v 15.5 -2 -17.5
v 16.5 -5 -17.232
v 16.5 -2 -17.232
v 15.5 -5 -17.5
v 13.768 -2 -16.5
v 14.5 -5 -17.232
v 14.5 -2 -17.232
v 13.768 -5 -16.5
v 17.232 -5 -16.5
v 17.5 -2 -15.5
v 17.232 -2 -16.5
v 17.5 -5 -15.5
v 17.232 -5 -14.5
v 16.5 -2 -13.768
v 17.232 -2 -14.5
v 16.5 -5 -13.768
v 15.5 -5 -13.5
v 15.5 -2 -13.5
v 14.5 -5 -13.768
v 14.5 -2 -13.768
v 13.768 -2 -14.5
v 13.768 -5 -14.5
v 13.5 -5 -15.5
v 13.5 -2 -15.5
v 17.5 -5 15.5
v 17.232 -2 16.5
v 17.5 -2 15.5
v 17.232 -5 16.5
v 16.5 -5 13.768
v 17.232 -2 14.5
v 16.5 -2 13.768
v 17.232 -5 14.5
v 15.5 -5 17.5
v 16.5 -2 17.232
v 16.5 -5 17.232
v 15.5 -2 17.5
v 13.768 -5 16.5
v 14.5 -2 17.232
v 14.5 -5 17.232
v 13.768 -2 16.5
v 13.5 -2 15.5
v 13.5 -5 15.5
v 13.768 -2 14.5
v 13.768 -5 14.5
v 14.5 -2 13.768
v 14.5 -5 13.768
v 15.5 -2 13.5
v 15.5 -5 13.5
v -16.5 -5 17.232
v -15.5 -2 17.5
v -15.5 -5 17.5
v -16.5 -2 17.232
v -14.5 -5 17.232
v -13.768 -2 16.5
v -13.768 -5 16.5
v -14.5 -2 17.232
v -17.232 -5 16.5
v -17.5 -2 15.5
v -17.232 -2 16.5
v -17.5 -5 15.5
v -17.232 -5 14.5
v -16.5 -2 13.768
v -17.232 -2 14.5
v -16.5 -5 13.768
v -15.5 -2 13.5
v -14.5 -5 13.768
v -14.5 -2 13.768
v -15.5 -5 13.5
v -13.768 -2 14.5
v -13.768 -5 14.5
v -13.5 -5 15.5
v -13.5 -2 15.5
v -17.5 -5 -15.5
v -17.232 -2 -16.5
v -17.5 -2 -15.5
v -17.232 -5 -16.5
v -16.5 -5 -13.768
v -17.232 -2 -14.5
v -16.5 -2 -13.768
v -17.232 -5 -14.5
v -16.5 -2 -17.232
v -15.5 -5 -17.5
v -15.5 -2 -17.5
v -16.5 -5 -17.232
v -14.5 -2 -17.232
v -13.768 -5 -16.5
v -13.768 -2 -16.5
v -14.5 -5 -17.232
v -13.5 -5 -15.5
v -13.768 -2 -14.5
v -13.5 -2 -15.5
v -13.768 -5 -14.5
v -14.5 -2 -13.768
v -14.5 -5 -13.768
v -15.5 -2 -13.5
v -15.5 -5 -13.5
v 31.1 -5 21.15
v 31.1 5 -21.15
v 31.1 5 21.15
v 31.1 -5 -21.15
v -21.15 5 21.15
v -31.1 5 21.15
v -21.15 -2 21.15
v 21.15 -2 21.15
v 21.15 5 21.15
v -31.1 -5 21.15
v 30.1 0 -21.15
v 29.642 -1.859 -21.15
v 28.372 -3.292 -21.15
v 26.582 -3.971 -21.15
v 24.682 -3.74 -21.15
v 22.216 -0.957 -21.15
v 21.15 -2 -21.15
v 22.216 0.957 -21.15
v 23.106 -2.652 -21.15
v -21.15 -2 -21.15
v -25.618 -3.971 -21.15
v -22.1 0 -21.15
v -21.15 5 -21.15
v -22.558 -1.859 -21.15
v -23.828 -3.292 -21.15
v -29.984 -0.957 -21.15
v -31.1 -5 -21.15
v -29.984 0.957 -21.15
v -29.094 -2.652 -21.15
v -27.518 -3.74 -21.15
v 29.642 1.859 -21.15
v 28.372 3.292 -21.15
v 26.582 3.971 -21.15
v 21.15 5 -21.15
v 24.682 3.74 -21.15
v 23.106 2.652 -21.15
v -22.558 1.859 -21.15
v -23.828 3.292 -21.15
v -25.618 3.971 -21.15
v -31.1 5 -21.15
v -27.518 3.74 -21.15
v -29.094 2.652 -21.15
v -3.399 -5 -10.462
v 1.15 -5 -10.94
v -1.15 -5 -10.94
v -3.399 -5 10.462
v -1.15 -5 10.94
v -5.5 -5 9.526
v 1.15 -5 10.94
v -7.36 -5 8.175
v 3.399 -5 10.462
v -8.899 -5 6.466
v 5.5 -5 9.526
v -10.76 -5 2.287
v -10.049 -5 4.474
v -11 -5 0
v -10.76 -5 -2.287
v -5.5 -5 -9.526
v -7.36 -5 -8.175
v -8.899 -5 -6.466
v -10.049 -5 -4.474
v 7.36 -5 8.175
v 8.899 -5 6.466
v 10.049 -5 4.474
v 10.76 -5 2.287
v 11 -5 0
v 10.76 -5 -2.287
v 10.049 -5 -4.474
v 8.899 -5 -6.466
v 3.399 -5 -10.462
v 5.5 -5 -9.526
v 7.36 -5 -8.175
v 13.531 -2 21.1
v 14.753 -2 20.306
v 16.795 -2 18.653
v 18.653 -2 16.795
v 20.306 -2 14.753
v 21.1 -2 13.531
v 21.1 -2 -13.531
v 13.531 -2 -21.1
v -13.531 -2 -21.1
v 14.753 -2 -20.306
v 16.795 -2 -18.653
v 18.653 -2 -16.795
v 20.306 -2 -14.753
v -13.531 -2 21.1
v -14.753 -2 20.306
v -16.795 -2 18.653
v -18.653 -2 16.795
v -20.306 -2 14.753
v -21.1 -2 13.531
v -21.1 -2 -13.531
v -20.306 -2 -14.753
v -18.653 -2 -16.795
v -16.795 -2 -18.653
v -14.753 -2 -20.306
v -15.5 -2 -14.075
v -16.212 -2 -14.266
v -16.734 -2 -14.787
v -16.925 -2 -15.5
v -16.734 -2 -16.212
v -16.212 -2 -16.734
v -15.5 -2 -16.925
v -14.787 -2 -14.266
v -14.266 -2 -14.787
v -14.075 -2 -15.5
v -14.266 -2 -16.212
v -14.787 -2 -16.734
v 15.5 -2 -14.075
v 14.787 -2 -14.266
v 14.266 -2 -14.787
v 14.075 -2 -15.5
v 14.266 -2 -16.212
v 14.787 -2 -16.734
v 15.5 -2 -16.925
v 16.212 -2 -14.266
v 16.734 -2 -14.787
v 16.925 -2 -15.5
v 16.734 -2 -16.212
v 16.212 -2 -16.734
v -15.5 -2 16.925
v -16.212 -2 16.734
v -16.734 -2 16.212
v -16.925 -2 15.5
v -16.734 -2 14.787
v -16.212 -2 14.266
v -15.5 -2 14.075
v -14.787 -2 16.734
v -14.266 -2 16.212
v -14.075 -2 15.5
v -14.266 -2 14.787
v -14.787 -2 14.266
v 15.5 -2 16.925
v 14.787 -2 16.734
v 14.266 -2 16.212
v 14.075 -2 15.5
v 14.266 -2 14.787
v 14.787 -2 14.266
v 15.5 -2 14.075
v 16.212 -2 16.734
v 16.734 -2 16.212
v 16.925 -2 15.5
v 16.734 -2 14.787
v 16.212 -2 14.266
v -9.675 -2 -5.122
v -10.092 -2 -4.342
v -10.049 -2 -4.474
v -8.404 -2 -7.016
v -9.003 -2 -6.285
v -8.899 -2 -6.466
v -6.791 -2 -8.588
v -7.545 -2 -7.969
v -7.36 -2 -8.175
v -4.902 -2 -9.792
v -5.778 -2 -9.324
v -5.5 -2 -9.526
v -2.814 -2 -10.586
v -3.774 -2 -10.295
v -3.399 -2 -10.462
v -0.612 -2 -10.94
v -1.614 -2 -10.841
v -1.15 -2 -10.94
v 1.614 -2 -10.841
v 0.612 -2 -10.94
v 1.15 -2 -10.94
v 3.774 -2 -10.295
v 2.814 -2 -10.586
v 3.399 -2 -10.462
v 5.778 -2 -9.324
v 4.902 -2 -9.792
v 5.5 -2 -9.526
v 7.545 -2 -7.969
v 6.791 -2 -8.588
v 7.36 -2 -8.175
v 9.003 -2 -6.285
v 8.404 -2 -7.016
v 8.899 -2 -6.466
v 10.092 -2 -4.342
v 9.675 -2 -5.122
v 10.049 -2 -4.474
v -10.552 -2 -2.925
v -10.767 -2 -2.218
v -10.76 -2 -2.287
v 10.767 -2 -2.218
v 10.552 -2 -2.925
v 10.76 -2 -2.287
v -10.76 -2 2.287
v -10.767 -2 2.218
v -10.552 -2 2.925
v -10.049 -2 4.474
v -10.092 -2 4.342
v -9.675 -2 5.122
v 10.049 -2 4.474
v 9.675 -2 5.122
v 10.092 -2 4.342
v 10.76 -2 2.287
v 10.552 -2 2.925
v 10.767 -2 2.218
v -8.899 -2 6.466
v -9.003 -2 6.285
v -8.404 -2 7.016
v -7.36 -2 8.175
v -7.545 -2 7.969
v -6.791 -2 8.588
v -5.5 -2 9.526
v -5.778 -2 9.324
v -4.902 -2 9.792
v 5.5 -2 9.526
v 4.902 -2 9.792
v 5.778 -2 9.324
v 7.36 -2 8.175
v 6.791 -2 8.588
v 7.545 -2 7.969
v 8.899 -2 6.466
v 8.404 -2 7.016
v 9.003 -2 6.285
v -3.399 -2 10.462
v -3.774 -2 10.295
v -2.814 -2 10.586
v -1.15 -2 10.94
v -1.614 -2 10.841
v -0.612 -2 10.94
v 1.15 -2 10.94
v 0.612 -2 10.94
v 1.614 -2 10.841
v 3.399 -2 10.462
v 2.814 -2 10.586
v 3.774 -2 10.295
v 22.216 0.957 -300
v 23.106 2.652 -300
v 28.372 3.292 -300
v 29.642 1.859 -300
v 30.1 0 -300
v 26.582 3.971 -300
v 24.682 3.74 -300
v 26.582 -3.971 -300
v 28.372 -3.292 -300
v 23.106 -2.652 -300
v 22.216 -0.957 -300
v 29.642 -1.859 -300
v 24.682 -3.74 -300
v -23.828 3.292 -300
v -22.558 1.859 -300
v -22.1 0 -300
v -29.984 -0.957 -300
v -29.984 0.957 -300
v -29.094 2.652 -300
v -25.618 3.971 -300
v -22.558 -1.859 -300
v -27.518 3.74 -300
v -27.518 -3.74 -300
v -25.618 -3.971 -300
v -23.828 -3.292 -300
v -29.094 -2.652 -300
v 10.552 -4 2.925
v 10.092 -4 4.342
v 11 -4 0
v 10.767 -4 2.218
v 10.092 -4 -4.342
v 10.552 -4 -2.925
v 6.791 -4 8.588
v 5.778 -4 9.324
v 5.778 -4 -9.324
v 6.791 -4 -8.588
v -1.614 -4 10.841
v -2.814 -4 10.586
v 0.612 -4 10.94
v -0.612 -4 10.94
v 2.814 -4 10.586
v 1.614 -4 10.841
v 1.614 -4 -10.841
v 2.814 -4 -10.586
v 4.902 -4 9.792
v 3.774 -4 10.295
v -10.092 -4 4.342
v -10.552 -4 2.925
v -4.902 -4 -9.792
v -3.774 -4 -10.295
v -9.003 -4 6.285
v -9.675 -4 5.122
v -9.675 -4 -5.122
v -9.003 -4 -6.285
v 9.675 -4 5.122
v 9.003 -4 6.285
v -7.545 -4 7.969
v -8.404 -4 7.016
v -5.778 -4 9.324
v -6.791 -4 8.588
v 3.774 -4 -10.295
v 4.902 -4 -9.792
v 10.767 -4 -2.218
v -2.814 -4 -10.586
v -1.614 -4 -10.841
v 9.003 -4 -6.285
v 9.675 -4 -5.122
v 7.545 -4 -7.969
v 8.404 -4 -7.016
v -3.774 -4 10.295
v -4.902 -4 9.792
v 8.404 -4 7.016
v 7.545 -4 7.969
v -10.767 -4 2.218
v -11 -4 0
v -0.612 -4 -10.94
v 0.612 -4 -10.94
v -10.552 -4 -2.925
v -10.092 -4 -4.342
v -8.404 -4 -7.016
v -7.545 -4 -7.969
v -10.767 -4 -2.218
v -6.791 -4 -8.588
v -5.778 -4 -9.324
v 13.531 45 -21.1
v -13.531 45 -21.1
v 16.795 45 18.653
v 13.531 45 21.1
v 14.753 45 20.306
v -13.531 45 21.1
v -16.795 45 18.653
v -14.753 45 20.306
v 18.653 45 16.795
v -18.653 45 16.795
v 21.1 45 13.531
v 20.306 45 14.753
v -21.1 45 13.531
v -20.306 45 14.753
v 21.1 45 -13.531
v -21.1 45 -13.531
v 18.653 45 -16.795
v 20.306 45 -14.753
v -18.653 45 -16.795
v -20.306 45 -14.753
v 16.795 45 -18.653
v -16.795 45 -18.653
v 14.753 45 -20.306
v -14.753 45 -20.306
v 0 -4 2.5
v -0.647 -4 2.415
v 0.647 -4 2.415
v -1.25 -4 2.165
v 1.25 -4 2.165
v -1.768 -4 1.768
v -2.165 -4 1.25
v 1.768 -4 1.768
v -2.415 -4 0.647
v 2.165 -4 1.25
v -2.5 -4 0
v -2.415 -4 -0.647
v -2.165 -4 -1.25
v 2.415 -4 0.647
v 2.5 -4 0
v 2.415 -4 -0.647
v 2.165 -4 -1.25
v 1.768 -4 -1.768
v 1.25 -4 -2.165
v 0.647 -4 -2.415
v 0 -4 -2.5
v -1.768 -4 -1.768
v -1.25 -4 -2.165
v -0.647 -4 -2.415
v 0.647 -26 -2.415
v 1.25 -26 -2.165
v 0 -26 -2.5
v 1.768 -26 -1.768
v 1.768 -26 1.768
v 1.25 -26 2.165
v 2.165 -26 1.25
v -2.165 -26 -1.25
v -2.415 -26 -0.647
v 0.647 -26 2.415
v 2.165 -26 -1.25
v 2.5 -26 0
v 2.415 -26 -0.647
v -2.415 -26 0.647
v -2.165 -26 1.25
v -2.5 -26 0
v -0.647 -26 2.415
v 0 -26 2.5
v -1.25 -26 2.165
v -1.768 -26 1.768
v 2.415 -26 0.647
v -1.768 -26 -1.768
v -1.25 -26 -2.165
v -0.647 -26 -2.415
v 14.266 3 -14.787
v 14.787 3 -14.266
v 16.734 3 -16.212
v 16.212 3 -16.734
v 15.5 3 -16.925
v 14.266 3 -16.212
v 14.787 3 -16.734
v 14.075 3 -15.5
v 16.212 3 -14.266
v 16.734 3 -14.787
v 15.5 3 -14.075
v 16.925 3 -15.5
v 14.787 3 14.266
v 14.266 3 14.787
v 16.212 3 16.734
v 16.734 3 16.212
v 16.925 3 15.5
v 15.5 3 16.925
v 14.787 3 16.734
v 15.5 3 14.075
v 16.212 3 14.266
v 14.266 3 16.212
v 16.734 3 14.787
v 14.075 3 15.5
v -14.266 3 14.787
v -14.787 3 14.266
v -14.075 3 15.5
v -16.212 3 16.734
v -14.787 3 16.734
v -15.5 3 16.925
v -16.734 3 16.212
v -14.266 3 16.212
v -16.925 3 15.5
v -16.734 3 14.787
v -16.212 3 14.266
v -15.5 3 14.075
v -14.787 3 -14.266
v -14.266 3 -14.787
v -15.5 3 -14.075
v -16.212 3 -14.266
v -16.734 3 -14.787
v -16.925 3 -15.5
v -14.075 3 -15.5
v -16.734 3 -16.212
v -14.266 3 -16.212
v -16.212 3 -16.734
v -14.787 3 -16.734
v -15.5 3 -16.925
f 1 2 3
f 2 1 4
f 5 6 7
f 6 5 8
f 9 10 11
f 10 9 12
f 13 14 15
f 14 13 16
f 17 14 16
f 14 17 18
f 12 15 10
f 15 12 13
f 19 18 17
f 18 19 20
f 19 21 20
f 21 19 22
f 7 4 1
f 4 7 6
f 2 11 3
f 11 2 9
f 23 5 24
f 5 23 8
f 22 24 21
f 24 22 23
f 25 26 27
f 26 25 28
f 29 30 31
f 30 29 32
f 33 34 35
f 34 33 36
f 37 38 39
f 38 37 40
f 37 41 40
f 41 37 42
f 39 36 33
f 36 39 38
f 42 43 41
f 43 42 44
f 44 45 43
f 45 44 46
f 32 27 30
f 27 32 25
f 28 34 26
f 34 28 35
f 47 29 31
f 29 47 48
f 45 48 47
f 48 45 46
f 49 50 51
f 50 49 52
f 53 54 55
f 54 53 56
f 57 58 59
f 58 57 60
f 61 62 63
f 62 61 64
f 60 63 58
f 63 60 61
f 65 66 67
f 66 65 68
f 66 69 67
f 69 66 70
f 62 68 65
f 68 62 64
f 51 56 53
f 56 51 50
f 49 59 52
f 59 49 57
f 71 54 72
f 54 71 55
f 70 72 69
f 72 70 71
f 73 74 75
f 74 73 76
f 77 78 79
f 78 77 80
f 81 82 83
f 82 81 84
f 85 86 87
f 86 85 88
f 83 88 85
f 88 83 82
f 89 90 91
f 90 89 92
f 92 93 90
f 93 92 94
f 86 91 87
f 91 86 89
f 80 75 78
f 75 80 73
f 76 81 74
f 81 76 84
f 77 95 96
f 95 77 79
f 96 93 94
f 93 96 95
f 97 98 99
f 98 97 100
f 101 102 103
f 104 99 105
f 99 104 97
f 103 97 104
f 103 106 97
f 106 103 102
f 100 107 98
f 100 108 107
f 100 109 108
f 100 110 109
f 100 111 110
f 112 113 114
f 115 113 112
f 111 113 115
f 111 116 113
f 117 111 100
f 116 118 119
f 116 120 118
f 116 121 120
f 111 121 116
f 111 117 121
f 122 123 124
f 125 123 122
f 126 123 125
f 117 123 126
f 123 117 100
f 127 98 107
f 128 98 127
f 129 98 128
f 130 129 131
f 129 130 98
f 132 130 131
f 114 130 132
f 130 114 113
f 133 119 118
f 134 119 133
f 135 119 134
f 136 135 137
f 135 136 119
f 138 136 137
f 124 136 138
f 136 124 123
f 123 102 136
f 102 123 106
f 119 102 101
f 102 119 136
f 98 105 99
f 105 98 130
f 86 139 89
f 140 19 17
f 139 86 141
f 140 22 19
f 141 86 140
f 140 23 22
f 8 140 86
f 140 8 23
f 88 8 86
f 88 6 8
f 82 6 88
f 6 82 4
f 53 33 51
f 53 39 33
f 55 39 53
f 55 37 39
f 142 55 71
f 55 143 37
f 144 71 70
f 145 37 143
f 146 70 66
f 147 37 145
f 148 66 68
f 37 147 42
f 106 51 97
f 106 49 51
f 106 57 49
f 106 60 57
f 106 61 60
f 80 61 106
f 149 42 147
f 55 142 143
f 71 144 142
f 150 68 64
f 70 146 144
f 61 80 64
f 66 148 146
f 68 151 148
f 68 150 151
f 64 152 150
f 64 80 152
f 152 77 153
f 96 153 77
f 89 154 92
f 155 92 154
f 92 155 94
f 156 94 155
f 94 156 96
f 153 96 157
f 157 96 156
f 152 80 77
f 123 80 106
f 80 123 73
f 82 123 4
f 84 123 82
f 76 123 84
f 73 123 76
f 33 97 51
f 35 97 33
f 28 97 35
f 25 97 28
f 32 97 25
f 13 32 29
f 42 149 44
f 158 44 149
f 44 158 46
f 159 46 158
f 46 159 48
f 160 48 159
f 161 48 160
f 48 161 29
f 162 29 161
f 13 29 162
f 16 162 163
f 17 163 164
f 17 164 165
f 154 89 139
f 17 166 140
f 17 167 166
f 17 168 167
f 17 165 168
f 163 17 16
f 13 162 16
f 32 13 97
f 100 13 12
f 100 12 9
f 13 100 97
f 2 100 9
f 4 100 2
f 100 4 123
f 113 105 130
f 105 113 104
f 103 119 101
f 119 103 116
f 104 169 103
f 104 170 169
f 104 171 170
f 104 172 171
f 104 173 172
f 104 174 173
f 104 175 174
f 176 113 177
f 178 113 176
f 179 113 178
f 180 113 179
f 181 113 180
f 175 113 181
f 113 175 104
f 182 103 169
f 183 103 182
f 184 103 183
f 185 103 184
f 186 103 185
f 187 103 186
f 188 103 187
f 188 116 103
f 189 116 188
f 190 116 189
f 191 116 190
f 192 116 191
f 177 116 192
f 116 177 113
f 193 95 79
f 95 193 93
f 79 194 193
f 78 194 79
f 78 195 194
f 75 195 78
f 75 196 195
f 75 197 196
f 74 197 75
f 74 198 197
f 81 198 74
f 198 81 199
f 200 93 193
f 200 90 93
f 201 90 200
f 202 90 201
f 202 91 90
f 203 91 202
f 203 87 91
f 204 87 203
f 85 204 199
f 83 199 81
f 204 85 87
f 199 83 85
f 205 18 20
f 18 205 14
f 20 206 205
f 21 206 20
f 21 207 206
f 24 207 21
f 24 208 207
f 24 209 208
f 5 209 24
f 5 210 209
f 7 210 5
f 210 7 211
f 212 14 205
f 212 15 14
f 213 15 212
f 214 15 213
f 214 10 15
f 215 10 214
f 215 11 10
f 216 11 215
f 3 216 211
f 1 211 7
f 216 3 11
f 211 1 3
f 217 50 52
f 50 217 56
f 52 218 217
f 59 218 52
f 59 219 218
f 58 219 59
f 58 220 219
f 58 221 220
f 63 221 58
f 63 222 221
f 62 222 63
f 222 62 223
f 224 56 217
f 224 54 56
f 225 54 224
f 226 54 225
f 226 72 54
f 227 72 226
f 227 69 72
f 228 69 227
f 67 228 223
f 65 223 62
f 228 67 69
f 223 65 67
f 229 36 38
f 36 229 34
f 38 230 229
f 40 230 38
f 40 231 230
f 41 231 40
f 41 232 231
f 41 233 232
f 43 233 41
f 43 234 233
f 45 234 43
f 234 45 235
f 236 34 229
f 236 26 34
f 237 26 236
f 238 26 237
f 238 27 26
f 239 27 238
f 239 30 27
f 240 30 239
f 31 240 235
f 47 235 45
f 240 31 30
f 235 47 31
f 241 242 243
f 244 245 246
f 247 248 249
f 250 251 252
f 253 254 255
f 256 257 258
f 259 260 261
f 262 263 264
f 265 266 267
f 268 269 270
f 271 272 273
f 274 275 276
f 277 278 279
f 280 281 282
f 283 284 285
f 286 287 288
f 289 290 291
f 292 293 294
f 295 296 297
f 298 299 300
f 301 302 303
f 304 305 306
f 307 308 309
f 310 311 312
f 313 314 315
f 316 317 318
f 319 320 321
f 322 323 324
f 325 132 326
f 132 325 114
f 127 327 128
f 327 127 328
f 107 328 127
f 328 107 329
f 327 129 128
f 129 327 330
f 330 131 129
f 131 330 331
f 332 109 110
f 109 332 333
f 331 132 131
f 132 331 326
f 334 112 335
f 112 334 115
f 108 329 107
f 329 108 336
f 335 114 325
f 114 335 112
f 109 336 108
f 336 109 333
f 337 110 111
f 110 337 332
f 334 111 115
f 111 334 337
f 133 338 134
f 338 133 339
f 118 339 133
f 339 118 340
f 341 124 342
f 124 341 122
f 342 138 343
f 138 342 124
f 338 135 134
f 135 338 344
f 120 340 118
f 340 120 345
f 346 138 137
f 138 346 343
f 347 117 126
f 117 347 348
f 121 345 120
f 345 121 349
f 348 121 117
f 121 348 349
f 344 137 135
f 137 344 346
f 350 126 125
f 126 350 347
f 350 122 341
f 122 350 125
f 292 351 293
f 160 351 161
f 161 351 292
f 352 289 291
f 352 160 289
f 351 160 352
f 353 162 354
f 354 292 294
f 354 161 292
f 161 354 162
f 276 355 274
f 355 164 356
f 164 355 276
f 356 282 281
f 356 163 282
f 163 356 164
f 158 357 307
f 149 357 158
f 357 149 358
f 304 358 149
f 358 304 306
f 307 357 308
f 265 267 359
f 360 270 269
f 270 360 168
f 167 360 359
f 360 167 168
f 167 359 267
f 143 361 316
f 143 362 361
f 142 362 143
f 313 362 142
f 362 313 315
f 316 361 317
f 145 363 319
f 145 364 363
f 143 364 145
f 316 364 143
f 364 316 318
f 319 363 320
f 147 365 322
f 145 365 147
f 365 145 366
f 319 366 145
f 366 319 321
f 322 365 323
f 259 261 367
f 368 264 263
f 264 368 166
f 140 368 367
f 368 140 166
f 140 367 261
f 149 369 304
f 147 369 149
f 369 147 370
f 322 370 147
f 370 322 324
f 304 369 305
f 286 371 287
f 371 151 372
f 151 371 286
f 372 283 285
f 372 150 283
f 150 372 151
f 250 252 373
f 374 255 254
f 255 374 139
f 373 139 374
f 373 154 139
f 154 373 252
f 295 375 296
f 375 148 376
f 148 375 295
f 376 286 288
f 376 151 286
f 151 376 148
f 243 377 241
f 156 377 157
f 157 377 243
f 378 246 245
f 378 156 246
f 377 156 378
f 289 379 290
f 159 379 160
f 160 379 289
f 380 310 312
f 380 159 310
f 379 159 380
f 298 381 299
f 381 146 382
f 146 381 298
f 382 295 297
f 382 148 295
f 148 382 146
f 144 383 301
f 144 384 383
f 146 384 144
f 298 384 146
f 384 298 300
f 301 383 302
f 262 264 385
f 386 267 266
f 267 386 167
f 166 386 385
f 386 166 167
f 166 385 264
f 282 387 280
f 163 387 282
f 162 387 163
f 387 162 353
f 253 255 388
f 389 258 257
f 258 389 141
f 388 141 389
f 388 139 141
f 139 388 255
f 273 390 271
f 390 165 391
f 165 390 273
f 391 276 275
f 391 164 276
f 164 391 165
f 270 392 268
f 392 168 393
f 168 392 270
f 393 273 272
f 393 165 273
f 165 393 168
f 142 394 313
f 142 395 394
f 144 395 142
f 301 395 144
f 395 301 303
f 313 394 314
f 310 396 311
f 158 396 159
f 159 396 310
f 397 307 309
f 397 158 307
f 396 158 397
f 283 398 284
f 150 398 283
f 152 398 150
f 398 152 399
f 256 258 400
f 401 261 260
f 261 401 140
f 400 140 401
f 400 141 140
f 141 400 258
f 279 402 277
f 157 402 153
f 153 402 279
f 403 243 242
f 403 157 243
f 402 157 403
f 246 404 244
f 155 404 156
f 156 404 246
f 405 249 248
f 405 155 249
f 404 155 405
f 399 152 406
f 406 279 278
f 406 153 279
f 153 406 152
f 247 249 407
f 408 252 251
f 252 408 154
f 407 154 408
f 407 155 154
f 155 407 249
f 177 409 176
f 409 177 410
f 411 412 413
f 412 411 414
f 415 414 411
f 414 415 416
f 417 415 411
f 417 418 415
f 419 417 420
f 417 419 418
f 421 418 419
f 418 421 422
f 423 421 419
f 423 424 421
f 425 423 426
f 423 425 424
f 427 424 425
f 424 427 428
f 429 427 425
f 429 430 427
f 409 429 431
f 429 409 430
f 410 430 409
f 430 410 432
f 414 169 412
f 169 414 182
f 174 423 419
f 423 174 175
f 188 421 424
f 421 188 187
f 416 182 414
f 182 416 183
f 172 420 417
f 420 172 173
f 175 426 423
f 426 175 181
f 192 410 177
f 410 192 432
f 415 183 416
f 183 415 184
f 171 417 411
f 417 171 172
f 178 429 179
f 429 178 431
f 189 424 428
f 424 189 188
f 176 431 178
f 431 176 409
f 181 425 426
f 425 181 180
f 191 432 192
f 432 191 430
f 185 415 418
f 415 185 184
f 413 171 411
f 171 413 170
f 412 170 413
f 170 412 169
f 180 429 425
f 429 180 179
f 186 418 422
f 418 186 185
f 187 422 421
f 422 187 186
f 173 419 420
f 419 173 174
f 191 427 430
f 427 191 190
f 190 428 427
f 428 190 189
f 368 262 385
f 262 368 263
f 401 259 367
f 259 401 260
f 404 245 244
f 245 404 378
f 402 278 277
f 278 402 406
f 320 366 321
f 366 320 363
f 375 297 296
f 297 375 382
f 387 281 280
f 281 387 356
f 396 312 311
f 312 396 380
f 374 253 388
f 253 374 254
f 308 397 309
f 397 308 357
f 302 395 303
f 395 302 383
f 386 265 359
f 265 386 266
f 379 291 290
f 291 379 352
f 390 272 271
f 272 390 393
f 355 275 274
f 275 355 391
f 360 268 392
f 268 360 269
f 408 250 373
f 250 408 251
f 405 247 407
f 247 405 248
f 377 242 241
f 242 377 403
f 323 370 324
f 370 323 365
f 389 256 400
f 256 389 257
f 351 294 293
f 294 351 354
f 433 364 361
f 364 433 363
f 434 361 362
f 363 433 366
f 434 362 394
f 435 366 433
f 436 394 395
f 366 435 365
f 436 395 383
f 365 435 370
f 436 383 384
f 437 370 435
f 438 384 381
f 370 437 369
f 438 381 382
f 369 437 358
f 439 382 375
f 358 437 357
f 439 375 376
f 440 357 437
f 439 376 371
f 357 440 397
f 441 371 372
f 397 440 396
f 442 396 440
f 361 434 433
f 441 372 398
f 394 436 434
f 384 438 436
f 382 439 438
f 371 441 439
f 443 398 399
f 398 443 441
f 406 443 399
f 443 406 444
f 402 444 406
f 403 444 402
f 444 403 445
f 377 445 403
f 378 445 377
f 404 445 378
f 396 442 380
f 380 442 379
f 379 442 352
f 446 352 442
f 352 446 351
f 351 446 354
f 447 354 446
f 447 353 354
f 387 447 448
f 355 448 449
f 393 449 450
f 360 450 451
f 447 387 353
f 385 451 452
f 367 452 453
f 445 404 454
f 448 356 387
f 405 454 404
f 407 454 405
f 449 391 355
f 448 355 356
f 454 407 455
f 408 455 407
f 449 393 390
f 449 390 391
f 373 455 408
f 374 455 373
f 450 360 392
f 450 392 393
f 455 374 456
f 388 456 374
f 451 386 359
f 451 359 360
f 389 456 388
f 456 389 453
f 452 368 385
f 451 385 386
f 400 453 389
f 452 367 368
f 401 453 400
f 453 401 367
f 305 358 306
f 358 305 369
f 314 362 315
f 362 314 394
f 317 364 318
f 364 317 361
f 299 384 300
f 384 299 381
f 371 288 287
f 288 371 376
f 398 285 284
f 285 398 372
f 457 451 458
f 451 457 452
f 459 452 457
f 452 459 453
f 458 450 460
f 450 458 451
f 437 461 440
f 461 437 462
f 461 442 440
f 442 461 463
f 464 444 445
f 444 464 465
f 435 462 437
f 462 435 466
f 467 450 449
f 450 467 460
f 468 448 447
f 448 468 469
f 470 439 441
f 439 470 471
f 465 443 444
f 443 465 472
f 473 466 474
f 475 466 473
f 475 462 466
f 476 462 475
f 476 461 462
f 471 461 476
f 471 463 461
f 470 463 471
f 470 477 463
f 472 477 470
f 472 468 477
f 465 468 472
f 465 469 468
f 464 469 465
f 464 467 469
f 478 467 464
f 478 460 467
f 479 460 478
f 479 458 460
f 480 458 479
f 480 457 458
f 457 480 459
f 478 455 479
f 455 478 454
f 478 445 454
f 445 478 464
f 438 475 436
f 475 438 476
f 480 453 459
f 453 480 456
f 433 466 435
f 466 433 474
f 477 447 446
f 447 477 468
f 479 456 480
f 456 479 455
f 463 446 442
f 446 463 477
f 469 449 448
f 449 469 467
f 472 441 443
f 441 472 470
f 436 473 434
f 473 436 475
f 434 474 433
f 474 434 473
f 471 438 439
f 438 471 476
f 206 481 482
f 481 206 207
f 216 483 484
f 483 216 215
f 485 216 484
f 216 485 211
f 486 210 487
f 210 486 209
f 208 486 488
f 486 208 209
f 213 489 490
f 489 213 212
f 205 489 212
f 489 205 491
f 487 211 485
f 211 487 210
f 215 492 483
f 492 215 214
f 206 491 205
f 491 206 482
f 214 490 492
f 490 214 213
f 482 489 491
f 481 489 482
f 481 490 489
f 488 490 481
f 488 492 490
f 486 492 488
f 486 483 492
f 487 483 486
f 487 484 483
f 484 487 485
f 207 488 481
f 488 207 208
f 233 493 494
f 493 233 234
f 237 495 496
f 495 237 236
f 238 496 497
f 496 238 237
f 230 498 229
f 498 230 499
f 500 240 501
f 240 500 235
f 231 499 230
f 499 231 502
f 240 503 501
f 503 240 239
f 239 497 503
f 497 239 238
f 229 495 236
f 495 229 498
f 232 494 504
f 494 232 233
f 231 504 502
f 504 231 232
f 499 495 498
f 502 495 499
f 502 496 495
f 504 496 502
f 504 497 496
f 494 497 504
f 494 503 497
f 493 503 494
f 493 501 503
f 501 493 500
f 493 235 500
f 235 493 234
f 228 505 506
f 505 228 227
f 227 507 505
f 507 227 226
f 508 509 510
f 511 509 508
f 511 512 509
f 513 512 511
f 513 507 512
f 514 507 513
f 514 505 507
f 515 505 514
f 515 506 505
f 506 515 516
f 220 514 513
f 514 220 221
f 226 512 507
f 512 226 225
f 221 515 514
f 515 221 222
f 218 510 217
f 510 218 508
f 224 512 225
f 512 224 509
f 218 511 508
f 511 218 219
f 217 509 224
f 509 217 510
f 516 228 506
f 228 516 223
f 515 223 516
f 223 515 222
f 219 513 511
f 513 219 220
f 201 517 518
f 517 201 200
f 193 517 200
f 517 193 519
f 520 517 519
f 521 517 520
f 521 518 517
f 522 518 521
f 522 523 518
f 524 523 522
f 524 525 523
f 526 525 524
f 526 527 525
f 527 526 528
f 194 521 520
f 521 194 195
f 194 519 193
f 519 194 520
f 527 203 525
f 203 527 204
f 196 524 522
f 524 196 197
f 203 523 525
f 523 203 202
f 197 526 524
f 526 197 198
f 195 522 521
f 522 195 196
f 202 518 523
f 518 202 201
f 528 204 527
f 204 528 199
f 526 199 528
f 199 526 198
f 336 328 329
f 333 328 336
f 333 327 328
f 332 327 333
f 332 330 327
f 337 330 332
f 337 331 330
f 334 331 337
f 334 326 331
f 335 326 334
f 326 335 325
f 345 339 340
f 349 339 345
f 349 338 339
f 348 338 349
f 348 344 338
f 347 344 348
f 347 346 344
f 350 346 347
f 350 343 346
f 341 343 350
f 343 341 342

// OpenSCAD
// file: ../nema17.scad
// From Mini Kossel https://github.com/jcrocholl/kossel/blob/master/nema17.scad

module nema17() {
  motor_shaft_diameter = 5;
  motor_shaft_radius = motor_shaft_diameter/2;
  motor_length = 47;
  m3_major = 2.85;
  m3_radius = m3_major/2;

  // NEMA 17 stepper motor.
  difference() {
    union() {
      translate([0, 0, -motor_length/2]) intersection() {
        cube([42.2, 42.2, motor_length], center=true);
        cylinder(r=25.1, h=motor_length+1, center=true, $fn=60);
      }
      cylinder(r=11, h=4, center=true, $fn=32);
      cylinder(r=2.5, h=48, center=true, $fn=24);
    }
    for (a = [0:90:359]) {
      rotate([0, 0, a]) translate([15.5, 15.5, 0])
        cylinder(r=m3_radius, h=10, center=true, $fn=12);
    }
  }
}

nema17();
// main file
use <../nema17.scad>

width = 42.2 + (10*2);

difference() {

	// body
	cube([width, 10, 42.3], center=true);

	// motor space
	translate([0, 8, 0])  cube([42.3, 20, 43], center=true);

// nema17 mounting holes
	for (a = [0:90:359]) {
		translate([0,-1,0]) rotate([90, 90, 0]) rotate([0, 0, a]) translate([15.5, 15.5, 0])
		cylinder(r=2, h=10, center=true, $fn=12);
	}

	translate([(width/2)-5, 0, -25]) cylinder(r=4, h=25);
	translate([5-(width/2), 0, -25]) cylinder(r=4, h=25);

// motor center
	translate([0,-1,0]) rotate([90,0,0]) cylinder(r=11, h=10, center=true);

}

translate([0,-2,0]) rotate([90,90,0]) nema17();

// rods
translate([(width/2)-5, 0, -300]) cylinder(r=4, h=300);
translate([5-(width/2), 0, -300]) cylinder(r=4, h=300);
